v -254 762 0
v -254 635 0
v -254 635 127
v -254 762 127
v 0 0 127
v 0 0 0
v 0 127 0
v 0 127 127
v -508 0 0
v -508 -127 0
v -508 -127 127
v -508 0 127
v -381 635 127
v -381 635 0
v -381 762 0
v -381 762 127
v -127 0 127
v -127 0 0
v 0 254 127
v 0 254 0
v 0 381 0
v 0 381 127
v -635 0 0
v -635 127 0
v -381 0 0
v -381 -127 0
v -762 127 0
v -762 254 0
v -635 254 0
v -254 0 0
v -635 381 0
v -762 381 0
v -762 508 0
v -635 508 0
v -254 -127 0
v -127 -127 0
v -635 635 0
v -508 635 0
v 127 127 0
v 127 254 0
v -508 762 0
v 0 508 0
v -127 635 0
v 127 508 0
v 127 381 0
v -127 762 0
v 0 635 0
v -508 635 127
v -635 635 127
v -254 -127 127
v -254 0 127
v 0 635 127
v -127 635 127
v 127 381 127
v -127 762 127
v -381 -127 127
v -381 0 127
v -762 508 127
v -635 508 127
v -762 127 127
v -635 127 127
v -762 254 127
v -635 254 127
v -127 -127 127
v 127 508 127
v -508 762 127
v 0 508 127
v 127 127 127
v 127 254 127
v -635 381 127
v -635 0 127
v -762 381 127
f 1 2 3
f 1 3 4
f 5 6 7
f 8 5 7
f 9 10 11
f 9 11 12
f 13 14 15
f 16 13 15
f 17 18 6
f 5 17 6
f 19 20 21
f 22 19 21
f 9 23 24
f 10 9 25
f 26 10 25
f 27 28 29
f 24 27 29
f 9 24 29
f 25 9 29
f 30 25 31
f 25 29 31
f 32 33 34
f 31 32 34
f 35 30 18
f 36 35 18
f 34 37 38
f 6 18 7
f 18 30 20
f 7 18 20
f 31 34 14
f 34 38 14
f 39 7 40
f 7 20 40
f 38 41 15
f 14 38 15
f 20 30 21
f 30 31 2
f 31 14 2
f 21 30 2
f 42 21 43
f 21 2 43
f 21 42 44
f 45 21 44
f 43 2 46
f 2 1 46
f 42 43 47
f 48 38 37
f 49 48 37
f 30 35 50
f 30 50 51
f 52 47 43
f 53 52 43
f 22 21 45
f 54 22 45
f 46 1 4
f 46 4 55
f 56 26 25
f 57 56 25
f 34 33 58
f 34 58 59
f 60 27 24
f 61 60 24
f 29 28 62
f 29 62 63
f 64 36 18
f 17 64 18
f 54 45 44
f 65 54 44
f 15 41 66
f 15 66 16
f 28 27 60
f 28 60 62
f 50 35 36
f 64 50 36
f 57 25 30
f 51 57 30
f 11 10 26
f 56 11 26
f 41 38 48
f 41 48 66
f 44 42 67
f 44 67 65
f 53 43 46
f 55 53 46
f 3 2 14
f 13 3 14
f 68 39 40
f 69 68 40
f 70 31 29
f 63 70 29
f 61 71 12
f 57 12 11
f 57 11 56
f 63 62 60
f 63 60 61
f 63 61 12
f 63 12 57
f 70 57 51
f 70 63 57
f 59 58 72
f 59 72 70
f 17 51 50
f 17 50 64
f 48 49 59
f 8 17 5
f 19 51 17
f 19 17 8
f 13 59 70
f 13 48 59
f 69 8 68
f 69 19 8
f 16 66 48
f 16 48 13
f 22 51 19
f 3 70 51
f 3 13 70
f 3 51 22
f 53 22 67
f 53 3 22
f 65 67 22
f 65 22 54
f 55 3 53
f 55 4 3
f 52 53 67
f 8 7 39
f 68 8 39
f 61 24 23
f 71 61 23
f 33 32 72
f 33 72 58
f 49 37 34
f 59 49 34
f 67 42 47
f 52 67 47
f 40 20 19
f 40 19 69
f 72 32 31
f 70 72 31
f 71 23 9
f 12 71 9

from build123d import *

# Parameters (mm, degrees)
F0_W     = 127
F0_H     = 127
F1_DEPTH = 127


with BuildPart() as f1:
    # F0 (on Top) → F1 (new body)
    with BuildSketch(Plane.XY):
        Polygon((-127, 0), (0, 0), (0, 127), (0, 254), (0, 381), (0, 508), (0, 635), (-127, 635), (-254, 635), (-381, 635), (-508, 635), (-635, 635), (-635, 508), (-635, 381), (-635, 254), (-635, 127), (-635, 0), (-508, 0), (-381, 0), (-254, 0), align=None)
        with Locations((-190.5, -63.5)):
            Rectangle(F0_W, F0_H)
        with Locations((63.5, 190.5)):
            Rectangle(F0_W, F0_H)
        with Locations((-444.5, -63.5)):
            Rectangle(F0_W, F0_H)
        with Locations((63.5, 444.5)):
            Rectangle(F0_W, F0_H)
        with Locations((-698.5, 190.5)):
            Rectangle(F0_W, F0_H)
        with Locations((-190.5, 698.5)):
            Rectangle(F0_W, F0_H)
        with Locations((-698.5, 444.5)):
            Rectangle(F0_W, F0_H)
        with Locations((-444.5, 698.5)):
            Rectangle(F0_W, F0_H)
    extrude(amount=F1_DEPTH)


solid = f1.part
